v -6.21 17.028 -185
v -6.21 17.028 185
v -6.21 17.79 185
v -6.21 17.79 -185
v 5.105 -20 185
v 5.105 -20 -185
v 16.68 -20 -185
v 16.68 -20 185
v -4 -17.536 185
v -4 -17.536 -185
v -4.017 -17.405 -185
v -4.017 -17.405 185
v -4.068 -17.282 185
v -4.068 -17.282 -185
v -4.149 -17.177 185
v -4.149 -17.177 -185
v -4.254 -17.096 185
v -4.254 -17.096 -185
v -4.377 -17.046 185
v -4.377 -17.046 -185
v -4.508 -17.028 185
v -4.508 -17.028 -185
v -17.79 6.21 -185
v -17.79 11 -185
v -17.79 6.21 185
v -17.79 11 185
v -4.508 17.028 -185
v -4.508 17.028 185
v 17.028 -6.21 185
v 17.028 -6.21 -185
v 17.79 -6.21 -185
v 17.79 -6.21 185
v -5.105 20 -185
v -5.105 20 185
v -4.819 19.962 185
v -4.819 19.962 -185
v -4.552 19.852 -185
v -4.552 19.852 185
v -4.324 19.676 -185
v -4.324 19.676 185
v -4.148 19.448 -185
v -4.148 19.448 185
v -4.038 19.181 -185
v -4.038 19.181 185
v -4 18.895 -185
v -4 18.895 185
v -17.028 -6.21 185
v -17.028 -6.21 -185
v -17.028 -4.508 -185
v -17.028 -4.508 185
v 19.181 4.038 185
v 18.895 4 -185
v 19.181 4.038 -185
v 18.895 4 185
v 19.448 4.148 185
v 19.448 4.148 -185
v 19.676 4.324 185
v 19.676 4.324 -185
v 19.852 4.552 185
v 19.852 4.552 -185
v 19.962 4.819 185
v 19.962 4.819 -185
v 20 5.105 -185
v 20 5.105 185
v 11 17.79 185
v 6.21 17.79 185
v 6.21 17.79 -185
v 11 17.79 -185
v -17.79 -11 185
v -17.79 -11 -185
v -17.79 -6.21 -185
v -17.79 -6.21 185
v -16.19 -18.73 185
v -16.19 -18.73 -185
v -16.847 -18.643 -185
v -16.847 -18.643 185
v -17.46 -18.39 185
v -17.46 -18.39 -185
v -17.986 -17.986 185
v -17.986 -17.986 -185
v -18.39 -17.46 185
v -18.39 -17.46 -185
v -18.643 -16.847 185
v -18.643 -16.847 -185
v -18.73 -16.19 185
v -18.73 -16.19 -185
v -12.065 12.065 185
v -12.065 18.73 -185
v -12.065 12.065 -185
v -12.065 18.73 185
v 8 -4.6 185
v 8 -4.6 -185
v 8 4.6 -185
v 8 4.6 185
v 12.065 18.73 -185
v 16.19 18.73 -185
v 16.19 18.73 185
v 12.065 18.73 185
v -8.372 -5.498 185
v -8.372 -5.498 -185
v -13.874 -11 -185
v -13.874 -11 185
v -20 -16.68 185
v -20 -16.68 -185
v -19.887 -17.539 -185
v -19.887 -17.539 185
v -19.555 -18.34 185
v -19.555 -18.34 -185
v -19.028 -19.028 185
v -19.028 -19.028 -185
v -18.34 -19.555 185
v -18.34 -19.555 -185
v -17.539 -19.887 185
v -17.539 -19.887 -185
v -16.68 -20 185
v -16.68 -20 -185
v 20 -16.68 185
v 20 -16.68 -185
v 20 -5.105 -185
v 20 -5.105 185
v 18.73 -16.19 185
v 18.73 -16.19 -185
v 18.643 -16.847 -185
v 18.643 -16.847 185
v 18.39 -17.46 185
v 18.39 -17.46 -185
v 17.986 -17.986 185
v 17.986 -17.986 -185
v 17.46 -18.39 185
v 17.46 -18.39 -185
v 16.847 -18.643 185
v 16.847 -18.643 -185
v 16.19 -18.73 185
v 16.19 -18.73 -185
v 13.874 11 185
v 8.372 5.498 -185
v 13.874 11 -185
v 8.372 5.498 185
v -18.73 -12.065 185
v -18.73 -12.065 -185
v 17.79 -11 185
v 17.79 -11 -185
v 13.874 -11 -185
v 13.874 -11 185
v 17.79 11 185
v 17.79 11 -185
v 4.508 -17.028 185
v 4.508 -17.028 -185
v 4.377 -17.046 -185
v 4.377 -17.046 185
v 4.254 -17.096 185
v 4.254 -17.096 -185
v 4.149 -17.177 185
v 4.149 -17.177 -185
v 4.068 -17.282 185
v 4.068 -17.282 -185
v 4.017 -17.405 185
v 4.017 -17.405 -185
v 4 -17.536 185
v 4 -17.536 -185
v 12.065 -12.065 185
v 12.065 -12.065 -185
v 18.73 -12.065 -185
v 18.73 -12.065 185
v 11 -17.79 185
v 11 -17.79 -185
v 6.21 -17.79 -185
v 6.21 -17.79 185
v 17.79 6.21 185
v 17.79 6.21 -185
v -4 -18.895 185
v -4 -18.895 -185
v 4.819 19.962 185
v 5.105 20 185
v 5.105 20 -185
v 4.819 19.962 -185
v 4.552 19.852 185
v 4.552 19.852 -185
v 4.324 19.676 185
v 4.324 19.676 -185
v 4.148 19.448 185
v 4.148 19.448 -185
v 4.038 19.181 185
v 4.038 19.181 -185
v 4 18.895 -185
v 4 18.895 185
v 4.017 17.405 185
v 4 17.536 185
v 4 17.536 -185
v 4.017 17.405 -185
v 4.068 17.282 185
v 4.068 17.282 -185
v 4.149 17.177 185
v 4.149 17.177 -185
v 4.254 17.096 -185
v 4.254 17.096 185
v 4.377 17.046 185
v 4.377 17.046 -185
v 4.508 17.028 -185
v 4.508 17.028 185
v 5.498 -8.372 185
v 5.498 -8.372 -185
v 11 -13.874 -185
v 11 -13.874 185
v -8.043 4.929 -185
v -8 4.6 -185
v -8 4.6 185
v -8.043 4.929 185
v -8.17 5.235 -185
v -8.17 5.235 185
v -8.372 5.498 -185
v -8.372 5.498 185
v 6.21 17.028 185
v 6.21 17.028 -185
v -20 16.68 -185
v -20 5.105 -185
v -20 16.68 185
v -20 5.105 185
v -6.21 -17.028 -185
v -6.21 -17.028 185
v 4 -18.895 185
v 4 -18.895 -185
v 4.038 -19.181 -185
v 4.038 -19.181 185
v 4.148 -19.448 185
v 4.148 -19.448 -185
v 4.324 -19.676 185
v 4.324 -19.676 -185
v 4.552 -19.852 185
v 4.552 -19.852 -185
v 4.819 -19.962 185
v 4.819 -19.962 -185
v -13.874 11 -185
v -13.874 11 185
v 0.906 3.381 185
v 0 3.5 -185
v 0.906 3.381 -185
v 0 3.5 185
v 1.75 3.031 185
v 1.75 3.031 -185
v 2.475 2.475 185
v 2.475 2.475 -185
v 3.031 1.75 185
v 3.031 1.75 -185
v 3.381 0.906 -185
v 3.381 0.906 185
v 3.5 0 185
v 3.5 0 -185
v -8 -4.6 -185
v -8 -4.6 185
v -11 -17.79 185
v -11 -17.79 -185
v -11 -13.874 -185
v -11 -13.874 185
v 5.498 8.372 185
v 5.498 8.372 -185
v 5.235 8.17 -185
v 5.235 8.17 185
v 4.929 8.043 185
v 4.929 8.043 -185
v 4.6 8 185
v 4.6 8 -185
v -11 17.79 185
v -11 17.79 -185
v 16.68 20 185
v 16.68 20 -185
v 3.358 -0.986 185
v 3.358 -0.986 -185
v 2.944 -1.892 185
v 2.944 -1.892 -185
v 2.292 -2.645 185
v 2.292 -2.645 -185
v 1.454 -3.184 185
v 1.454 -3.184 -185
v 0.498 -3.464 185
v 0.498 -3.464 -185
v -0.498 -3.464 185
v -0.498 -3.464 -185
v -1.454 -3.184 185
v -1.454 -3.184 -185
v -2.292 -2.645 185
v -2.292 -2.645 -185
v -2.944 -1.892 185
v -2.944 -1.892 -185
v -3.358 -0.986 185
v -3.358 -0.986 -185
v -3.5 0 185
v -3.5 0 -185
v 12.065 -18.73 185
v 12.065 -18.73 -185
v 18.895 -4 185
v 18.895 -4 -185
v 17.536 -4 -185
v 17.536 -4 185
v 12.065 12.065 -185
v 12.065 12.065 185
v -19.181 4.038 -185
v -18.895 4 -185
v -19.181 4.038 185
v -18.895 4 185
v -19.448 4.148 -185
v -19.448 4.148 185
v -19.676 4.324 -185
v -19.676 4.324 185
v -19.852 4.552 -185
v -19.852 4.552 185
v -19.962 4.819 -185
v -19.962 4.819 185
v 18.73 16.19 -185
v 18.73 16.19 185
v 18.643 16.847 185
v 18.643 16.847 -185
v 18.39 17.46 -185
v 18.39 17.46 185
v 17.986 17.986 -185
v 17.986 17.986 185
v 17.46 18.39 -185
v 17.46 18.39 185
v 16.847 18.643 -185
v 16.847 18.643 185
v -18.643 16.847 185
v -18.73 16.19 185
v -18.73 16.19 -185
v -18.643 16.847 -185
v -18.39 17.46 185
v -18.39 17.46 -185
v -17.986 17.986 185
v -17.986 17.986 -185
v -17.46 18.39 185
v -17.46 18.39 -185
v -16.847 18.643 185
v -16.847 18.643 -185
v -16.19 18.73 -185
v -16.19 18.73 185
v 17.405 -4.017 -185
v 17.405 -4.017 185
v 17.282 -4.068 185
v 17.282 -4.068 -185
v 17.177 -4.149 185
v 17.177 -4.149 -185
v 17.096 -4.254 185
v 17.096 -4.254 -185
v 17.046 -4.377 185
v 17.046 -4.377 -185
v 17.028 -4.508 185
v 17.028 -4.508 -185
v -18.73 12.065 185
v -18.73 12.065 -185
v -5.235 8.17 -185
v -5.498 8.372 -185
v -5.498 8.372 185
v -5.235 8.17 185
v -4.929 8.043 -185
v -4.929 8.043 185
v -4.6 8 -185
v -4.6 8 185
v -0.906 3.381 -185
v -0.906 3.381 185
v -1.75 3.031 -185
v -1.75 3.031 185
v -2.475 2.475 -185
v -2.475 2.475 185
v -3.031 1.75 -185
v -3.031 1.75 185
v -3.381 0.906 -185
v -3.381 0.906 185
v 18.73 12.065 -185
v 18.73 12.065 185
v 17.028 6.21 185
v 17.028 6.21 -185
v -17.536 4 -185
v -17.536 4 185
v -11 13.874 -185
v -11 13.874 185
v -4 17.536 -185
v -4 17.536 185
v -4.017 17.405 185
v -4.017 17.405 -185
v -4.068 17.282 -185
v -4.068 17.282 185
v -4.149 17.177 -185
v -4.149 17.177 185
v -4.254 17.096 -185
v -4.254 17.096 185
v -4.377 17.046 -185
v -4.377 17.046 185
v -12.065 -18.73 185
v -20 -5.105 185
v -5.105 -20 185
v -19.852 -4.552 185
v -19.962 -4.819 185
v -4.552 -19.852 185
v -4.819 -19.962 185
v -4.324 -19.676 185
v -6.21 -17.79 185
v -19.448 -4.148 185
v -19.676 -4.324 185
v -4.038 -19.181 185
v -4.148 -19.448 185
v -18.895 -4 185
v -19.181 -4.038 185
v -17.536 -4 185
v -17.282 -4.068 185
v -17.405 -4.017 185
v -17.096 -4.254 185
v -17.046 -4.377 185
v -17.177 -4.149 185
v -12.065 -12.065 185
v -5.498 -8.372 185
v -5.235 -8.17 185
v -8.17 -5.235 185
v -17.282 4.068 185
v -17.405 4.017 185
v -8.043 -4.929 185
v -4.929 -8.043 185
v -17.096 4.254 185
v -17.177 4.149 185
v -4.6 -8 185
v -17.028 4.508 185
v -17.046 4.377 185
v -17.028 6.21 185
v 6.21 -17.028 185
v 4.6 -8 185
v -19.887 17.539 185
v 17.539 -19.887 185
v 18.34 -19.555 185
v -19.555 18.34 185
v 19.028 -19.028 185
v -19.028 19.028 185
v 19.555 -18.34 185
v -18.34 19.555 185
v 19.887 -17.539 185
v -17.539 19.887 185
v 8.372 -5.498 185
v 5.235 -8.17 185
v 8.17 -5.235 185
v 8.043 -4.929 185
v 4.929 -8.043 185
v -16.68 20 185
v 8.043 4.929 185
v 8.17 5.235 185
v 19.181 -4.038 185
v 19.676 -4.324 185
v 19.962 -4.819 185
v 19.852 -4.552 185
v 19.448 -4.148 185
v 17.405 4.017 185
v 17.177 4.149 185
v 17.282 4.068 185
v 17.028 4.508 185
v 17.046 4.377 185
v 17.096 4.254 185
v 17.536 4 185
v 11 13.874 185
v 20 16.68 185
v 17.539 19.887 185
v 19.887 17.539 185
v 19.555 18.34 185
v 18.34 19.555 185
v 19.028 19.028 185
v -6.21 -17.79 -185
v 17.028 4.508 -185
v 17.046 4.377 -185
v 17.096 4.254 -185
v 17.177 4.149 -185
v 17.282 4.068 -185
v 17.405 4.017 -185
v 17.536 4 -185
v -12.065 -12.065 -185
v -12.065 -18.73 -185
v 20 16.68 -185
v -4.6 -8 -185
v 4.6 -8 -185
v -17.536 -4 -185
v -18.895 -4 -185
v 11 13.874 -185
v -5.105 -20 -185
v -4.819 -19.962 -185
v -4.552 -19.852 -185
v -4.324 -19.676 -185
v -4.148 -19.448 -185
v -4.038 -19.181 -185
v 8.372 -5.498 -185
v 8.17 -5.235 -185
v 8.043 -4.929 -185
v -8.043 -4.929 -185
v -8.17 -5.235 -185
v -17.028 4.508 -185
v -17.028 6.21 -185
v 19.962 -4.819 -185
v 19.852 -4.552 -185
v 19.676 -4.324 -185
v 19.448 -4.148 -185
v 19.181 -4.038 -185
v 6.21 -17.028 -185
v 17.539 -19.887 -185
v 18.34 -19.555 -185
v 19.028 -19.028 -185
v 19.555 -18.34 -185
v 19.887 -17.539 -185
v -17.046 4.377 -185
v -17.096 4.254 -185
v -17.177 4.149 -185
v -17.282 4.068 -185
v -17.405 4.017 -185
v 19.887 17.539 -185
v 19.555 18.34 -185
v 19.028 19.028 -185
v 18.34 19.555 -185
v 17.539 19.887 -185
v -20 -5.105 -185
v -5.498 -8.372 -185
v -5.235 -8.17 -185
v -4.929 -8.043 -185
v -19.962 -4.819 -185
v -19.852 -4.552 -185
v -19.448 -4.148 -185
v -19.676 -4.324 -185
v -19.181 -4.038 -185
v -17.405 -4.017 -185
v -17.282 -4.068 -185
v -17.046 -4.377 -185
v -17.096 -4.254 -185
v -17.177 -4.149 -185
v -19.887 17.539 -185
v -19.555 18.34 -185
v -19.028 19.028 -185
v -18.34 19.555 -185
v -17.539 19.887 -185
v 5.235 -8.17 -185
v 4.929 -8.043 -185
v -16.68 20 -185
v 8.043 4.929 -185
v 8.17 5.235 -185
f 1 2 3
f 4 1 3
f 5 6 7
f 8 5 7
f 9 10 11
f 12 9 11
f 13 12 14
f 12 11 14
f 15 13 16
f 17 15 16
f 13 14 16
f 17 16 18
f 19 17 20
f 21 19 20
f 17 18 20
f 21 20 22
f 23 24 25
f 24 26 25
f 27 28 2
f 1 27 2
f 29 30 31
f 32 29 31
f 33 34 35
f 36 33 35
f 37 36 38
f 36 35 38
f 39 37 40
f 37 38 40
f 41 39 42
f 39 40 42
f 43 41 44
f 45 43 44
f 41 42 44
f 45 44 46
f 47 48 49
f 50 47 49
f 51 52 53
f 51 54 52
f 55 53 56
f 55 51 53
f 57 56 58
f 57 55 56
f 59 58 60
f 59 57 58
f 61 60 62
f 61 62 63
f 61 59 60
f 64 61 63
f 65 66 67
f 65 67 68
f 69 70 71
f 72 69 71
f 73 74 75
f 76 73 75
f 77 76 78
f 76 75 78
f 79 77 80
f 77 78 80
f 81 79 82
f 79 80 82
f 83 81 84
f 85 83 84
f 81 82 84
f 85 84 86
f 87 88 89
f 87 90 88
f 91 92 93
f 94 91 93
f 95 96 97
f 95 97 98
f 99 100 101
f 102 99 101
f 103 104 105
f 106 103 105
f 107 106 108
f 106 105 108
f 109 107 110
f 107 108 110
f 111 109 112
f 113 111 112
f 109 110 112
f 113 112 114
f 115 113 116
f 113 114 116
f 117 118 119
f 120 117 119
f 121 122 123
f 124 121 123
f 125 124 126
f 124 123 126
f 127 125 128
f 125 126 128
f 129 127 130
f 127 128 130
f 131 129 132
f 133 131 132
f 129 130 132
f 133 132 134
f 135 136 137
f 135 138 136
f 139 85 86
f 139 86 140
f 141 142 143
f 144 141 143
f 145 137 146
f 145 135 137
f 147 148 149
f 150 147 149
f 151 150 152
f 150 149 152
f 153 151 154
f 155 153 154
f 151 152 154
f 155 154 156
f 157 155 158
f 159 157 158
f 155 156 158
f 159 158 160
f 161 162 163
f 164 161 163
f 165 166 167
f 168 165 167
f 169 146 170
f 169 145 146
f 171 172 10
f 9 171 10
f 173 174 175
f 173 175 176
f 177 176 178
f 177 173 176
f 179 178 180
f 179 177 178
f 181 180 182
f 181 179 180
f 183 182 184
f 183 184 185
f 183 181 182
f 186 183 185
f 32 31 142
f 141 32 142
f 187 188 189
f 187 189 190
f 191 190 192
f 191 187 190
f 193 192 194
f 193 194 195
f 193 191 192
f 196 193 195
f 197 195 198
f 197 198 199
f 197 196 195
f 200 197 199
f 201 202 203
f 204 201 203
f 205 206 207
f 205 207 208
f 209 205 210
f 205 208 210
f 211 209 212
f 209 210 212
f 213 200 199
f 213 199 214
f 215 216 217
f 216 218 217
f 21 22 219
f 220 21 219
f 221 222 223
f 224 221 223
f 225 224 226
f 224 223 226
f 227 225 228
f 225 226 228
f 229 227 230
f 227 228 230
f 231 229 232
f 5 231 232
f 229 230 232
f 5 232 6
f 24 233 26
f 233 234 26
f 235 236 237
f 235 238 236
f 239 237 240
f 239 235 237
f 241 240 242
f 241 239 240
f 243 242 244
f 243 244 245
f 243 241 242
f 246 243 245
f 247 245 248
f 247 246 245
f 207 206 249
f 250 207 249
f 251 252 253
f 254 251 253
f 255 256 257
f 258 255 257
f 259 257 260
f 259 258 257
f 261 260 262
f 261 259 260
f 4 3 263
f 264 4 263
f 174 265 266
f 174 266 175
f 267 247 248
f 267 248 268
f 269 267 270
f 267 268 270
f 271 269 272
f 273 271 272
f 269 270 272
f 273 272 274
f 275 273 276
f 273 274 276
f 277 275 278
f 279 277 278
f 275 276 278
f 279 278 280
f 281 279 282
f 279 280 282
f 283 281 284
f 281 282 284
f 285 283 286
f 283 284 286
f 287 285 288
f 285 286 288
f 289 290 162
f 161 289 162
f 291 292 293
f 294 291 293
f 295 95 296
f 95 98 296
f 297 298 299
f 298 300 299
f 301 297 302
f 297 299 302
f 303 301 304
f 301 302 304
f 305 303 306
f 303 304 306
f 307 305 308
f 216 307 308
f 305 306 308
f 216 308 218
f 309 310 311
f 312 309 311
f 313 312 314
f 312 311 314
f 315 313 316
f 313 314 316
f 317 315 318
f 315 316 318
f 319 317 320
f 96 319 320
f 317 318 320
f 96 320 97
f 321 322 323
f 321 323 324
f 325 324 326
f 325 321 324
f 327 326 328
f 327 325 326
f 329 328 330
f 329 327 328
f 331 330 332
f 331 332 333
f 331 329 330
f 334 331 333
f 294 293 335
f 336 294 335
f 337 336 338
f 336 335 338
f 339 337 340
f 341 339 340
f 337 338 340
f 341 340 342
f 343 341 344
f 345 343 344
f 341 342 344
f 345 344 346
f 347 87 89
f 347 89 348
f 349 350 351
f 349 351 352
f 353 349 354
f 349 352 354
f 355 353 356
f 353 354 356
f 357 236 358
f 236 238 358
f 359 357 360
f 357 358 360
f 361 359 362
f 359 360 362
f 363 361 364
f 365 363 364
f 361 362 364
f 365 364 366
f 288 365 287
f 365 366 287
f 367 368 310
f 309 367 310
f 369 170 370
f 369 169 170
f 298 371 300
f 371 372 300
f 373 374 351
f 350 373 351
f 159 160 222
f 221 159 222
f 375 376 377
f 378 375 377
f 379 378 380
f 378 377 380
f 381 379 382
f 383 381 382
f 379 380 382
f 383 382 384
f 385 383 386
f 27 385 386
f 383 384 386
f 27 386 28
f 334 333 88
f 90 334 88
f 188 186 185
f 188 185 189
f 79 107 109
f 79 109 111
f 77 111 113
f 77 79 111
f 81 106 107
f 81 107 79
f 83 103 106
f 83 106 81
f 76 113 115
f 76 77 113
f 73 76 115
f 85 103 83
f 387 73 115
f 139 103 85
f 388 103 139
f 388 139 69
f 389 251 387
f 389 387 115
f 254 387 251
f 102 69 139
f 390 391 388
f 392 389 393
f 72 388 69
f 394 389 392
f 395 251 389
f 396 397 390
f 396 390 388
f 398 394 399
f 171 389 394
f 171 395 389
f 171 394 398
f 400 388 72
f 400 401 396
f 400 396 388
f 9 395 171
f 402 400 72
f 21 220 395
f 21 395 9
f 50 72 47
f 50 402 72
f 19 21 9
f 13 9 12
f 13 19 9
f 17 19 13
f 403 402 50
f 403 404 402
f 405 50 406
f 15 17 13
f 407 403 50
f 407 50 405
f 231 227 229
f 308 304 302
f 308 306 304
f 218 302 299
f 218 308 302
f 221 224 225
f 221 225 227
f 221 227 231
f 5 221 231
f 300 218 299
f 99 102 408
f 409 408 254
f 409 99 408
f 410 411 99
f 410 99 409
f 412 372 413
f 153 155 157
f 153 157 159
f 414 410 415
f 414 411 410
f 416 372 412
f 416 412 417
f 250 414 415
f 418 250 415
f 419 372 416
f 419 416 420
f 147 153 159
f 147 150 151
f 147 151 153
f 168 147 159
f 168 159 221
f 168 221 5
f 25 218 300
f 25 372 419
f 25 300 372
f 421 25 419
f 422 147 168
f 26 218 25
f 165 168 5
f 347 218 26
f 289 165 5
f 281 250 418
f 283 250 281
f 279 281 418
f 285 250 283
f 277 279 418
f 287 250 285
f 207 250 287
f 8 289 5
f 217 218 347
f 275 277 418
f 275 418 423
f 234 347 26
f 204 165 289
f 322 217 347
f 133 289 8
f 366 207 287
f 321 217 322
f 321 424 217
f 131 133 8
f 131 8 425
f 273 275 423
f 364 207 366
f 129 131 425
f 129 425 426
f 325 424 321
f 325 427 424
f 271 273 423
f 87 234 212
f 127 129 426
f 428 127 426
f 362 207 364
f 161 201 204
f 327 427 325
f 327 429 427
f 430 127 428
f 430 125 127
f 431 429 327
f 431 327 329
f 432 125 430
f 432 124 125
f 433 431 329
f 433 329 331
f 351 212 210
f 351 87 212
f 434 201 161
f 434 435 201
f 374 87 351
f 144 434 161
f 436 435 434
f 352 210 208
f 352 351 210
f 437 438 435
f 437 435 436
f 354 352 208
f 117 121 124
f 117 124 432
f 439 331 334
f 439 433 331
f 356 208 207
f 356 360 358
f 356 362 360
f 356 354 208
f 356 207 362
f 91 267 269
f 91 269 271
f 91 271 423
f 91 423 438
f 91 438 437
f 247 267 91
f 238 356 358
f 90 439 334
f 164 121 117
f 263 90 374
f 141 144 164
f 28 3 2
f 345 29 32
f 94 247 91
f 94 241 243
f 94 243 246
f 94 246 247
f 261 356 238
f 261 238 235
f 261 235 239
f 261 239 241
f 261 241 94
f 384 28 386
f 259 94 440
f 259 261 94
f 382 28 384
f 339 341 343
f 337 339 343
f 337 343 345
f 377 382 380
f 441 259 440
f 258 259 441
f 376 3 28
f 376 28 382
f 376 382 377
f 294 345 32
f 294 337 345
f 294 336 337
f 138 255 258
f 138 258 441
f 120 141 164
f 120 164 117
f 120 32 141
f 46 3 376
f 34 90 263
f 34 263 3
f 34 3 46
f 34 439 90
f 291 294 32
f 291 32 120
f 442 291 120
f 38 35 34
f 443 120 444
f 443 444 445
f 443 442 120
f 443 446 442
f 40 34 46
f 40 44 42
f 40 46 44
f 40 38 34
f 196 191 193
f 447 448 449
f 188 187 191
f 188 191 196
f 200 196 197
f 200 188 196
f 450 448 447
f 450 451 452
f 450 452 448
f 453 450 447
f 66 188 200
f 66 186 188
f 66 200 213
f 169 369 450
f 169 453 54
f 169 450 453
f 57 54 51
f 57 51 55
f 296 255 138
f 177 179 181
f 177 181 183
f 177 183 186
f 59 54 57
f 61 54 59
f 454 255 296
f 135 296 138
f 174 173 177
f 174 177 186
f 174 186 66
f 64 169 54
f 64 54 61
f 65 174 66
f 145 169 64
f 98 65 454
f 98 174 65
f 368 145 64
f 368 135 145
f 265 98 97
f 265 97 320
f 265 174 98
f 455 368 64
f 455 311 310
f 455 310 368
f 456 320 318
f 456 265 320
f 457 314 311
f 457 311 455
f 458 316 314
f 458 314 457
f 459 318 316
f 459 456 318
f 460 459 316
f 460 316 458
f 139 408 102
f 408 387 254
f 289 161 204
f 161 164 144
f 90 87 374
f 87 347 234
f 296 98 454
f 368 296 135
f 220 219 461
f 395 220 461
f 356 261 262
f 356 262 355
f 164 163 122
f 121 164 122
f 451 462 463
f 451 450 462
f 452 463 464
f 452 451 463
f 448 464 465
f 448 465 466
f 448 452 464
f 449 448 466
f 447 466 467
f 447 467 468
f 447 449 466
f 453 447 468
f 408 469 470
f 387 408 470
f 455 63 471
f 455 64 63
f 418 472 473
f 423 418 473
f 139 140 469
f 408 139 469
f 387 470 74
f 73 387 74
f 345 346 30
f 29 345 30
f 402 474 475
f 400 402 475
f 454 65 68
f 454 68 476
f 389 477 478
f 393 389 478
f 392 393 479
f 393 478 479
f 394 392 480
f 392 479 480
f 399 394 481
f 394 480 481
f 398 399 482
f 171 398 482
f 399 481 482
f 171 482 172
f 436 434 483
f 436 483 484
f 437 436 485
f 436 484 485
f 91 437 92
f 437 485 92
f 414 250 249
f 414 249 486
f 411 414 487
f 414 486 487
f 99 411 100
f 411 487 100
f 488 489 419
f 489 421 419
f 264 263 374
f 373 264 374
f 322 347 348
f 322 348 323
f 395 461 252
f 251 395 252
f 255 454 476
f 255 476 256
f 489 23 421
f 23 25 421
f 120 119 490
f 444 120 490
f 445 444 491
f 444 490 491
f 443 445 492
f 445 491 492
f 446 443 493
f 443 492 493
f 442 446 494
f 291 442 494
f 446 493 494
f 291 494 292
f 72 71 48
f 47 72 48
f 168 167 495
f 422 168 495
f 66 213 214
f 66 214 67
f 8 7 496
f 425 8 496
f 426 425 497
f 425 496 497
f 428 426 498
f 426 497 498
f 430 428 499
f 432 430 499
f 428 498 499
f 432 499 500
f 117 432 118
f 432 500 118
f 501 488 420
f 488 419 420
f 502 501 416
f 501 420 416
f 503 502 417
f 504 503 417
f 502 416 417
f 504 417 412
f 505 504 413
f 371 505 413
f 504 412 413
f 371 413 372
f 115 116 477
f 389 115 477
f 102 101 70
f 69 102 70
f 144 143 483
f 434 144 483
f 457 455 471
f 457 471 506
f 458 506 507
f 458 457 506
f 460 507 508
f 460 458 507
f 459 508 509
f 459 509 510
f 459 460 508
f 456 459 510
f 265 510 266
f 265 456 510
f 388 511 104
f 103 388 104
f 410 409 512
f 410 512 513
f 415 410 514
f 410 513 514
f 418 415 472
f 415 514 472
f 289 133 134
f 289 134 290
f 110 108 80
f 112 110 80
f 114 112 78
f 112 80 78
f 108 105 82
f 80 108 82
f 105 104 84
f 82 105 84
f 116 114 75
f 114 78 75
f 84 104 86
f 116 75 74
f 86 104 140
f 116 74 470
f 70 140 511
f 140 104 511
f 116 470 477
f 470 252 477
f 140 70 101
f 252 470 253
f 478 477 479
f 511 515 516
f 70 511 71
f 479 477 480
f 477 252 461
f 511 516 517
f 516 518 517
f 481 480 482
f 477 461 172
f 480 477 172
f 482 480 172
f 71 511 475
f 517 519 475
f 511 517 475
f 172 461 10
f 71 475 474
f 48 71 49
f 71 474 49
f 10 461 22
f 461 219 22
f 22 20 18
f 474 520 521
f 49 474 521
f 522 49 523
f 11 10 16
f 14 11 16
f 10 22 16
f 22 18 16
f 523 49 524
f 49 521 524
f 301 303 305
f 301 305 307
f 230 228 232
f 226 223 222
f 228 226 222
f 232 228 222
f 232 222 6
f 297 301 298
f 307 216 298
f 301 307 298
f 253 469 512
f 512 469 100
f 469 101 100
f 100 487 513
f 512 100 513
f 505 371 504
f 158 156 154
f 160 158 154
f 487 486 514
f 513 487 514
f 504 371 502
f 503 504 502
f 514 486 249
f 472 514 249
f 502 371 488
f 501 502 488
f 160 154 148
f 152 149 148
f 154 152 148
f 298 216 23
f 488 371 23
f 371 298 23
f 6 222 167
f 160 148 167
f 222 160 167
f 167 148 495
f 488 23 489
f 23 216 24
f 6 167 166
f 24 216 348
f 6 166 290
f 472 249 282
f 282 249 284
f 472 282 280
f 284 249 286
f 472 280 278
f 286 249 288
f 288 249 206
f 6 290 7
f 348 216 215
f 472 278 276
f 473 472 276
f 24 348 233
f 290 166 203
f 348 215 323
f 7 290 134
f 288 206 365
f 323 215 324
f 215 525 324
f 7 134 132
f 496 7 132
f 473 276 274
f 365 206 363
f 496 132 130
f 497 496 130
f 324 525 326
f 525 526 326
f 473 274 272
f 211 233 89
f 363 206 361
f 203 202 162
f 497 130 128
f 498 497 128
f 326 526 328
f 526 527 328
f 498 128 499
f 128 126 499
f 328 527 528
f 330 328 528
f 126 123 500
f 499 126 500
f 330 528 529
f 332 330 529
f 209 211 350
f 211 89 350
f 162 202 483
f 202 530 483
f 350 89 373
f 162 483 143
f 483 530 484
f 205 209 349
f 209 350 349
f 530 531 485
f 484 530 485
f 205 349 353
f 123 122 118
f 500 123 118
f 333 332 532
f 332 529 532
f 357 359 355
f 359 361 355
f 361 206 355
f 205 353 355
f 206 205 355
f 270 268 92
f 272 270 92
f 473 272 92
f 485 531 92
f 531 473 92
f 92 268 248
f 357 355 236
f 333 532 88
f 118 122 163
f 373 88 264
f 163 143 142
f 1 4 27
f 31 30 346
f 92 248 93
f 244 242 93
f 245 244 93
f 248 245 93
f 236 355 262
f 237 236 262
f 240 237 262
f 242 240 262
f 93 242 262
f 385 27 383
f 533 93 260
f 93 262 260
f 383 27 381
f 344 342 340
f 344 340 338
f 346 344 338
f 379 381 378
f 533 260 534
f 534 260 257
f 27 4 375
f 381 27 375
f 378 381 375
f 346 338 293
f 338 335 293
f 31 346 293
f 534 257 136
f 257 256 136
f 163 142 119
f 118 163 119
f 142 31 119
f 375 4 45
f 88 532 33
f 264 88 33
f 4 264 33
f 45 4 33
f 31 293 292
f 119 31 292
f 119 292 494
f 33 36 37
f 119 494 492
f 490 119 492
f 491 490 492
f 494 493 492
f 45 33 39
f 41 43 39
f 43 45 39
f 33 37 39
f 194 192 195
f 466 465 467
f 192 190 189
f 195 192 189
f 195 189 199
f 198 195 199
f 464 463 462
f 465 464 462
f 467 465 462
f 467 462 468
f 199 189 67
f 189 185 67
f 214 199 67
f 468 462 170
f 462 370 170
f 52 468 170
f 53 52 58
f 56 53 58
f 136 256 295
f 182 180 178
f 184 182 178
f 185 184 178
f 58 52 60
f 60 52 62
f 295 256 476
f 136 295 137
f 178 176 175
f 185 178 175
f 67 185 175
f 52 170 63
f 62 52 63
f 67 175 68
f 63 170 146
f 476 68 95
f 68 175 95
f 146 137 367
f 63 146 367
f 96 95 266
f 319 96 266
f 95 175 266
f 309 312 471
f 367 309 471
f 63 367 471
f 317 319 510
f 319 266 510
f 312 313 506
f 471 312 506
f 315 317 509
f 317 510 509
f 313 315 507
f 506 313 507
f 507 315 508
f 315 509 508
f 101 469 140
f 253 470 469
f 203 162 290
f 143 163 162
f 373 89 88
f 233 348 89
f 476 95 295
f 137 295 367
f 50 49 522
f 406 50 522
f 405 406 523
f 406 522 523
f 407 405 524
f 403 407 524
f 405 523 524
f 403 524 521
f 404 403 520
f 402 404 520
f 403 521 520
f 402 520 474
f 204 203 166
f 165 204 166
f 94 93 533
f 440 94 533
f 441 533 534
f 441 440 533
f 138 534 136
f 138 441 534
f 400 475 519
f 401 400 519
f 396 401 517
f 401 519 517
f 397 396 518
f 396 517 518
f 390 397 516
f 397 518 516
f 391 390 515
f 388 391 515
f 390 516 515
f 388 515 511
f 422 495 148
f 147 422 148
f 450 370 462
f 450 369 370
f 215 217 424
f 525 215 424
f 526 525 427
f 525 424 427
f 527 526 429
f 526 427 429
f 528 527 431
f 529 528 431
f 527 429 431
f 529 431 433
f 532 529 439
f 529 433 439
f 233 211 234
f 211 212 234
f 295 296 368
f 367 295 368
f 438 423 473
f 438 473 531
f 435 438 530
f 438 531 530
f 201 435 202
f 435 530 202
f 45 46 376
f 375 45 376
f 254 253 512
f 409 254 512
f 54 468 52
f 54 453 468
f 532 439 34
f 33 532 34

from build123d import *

# Parameters (mm, degrees)
BOSS_EXTRUDE1_DEPTH = 185
MIRROR3_START       = -185
MIRROR3_DEPTH       = 370


# Read off the part's stored shape, not the designer's step: Mirror3
with BuildPart() as part:
    # Sketch3 → Boss-Extrude1 (new, symmetric)
    with BuildSketch(Plane.XY):
        with BuildLine():
            Line((0, 8), (0, 3.5))
            ThreePointArc((0, 3.5), (-2.474873734, 2.474873734), (-3.5, 0))
            Line((-3.5, 0), (-8, 0))
            Line((-8, 0), (-8, 4.600266817))
            ThreePointArc((-8, 4.600266817), (-8.096672994, 5.086274776), (-8.371974388, 5.498292429))
            Line((-8.371974388, 5.498292429), (-13.873681959, 11))
            Line((-13.873681959, 11), (-17.7902, 11))
            Line((-17.7902, 11), (-17.7902, 6.2098))
            Line((-17.7902, 6.2098), (-17.0282, 6.2098))
            Line((-17.0282, 6.2098), (-17.0282, 4.508))
            ThreePointArc((-17.0282, 4.508), (-17.176989755, 4.148789755), (-17.5362, 4))
            Line((-17.5362, 4), (-18.8951, 4))
            ThreePointArc((-18.8951, 4), (-19.676382283, 4.323617717), (-20, 5.1049))
            Line((-20, 5.1049), (-20, 16.68))
            ThreePointArc((-20, 16.68), (-19.027594514, 19.027594514), (-16.68, 20))
            Line((-16.68, 20), (-5.1049, 20))
            ThreePointArc((-5.1049, 20), (-4.323617717, 19.676382283), (-4, 18.8951))
            Line((-4, 18.8951), (-4, 17.5362))
            ThreePointArc((-4, 17.5362), (-4.148789755, 17.176989755), (-4.508, 17.0282))
            Line((-4.508, 17.0282), (-6.2098, 17.0282))
            Line((-6.2098, 17.0282), (-6.2098, 17.7902))
            Line((-6.2098, 17.7902), (-11, 17.7902))
            Line((-11, 17.7902), (-11, 13.873681959))
            Line((-11, 13.873681959), (-5.498292429, 8.371974388))
            ThreePointArc((-5.498292429, 8.371974388), (-5.086274776, 8.096672994), (-4.600266817, 8))
            Line((-4.600266817, 8), (0, 8))
        make_face()
        with BuildLine():
            Line((-12.065, 18.73), (-12.065, 12.065))
            Line((-12.065, 12.065), (-18.73, 12.065))
            Line((-18.73, 12.065), (-18.73, 16.19))
            ThreePointArc((-18.73, 16.19), (-17.986051224, 17.986051224), (-16.19, 18.73))
            Line((-16.19, 18.73), (-12.065, 18.73))
        make_face(mode=Mode.SUBTRACT)
    extrude(amount=BOSS_EXTRUDE1_DEPTH, both=True)

    # Mirror1: part across plane


with BuildPart() as part_1:
    add(part.part)
    add(part.part.mirror(Plane(origin=(0, 0, 185), x_dir=(0, 0, 1), z_dir=(1, 0, 0))))

    # Mirror3 outline → Mirror3 (add)
    with BuildSketch(Plane.XY.offset(MIRROR3_START)):
        with BuildLine():
            Line((-8, 0), (-8, -4.600266817))
            ThreePointArc((-8, -4.600266817), (-8.096672994, -5.086274776), (-8.371974388, -5.498292429))
            Line((-8.371974388, -5.498292429), (-13.873681959, -11))
            Line((-13.873681959, -11), (-17.7902, -11))
            Line((-17.7902, -11), (-17.7902, -6.2098))
            Line((-17.7902, -6.2098), (-17.0282, -6.2098))
            Line((-17.0282, -6.2098), (-17.0282, -4.508))
            ThreePointArc((-17.0282, -4.508), (-17.176989755, -4.148789755), (-17.5362, -4))
            Line((-17.5362, -4), (-18.8951, -4))
            ThreePointArc((-18.8951, -4), (-19.676382283, -4.323617717), (-20, -5.1049))
            Line((-20, -5.1049), (-20, -16.68))
            ThreePointArc((-20, -16.68), (-19.027594514, -19.027594514), (-16.68, -20))
            Line((-16.68, -20), (-5.1049, -20))
            ThreePointArc((-5.1049, -20), (-4.323617717, -19.676382283), (-4, -18.8951))
            Line((-4, -18.8951), (-4, -17.5362))
            ThreePointArc((-4, -17.5362), (-4.148789755, -17.176989755), (-4.508, -17.0282))
            Line((-4.508, -17.0282), (-6.2098, -17.0282))
            Line((-6.2098, -17.0282), (-6.2098, -17.7902))
            Line((-6.2098, -17.7902), (-11, -17.7902))
            Line((-11, -17.7902), (-11, -13.873681959))
            Line((-11, -13.873681959), (-5.498292429, -8.371974388))
            ThreePointArc((-5.498292429, -8.371974388), (-5.086274776, -8.096672994), (-4.600266817, -8))
            Line((-4.600266817, -8), (4.600266817, -8))
            ThreePointArc((4.600266817, -8), (5.086274776, -8.096672994), (5.498292429, -8.371974388))
            Line((5.498292429, -8.371974388), (11, -13.873681959))
            Line((11, -13.873681959), (11, -17.7902))
            Line((11, -17.7902), (6.2098, -17.7902))
            Line((6.2098, -17.7902), (6.2098, -17.0282))
            Line((6.2098, -17.0282), (4.508, -17.0282))
            ThreePointArc((4.508, -17.0282), (4.148789755, -17.176989755), (4, -17.5362))
            Line((4, -17.5362), (4, -18.8951))
            ThreePointArc((4, -18.8951), (4.323617717, -19.676382283), (5.1049, -20))
            Line((5.1049, -20), (16.68, -20))
            ThreePointArc((16.68, -20), (19.027594514, -19.027594514), (20, -16.68))
            Line((20, -16.68), (20, -5.1049))
            ThreePointArc((20, -5.1049), (19.676382283, -4.323617717), (18.8951, -4))
            Line((18.8951, -4), (17.5362, -4))
            ThreePointArc((17.5362, -4), (17.176989755, -4.148789755), (17.0282, -4.508))
            Line((17.0282, -4.508), (17.0282, -6.2098))
            Line((17.0282, -6.2098), (17.7902, -6.2098))
            Line((17.7902, -6.2098), (17.7902, -11))
            Line((17.7902, -11), (13.873681959, -11))
            Line((13.873681959, -11), (8.371974388, -5.498292429))
            ThreePointArc((8.371974388, -5.498292429), (8.096672994, -5.086274776), (8, -4.600266817))
            Line((8, -4.600266817), (8, 0))
            Line((8, 0), (3.5, 0))
            ThreePointArc((3.5, 0), (0, -3.5), (-3.5, 0))
            Line((-3.5, 0), (-8, 0))
        make_face()
        with BuildLine():
            Line((-12.065, -12.065), (-12.065, -18.73))
            Line((-12.065, -18.73), (-16.19, -18.73))
            ThreePointArc((-16.19, -18.73), (-17.986051224, -17.986051224), (-18.73, -16.19))
            Line((-18.73, -16.19), (-18.73, -12.065))
            Line((-18.73, -12.065), (-12.065, -12.065))
        make_face(mode=Mode.SUBTRACT)
        with BuildLine():
            Line((12.065, -18.73), (12.065, -12.065))
            Line((12.065, -12.065), (18.73, -12.065))
            Line((18.73, -12.065), (18.73, -16.19))
            ThreePointArc((18.73, -16.19), (17.986051224, -17.986051224), (16.19, -18.73))
            Line((16.19, -18.73), (12.065, -18.73))
        make_face(mode=Mode.SUBTRACT)
    extrude(amount=MIRROR3_DEPTH)


solid = part_1.part
